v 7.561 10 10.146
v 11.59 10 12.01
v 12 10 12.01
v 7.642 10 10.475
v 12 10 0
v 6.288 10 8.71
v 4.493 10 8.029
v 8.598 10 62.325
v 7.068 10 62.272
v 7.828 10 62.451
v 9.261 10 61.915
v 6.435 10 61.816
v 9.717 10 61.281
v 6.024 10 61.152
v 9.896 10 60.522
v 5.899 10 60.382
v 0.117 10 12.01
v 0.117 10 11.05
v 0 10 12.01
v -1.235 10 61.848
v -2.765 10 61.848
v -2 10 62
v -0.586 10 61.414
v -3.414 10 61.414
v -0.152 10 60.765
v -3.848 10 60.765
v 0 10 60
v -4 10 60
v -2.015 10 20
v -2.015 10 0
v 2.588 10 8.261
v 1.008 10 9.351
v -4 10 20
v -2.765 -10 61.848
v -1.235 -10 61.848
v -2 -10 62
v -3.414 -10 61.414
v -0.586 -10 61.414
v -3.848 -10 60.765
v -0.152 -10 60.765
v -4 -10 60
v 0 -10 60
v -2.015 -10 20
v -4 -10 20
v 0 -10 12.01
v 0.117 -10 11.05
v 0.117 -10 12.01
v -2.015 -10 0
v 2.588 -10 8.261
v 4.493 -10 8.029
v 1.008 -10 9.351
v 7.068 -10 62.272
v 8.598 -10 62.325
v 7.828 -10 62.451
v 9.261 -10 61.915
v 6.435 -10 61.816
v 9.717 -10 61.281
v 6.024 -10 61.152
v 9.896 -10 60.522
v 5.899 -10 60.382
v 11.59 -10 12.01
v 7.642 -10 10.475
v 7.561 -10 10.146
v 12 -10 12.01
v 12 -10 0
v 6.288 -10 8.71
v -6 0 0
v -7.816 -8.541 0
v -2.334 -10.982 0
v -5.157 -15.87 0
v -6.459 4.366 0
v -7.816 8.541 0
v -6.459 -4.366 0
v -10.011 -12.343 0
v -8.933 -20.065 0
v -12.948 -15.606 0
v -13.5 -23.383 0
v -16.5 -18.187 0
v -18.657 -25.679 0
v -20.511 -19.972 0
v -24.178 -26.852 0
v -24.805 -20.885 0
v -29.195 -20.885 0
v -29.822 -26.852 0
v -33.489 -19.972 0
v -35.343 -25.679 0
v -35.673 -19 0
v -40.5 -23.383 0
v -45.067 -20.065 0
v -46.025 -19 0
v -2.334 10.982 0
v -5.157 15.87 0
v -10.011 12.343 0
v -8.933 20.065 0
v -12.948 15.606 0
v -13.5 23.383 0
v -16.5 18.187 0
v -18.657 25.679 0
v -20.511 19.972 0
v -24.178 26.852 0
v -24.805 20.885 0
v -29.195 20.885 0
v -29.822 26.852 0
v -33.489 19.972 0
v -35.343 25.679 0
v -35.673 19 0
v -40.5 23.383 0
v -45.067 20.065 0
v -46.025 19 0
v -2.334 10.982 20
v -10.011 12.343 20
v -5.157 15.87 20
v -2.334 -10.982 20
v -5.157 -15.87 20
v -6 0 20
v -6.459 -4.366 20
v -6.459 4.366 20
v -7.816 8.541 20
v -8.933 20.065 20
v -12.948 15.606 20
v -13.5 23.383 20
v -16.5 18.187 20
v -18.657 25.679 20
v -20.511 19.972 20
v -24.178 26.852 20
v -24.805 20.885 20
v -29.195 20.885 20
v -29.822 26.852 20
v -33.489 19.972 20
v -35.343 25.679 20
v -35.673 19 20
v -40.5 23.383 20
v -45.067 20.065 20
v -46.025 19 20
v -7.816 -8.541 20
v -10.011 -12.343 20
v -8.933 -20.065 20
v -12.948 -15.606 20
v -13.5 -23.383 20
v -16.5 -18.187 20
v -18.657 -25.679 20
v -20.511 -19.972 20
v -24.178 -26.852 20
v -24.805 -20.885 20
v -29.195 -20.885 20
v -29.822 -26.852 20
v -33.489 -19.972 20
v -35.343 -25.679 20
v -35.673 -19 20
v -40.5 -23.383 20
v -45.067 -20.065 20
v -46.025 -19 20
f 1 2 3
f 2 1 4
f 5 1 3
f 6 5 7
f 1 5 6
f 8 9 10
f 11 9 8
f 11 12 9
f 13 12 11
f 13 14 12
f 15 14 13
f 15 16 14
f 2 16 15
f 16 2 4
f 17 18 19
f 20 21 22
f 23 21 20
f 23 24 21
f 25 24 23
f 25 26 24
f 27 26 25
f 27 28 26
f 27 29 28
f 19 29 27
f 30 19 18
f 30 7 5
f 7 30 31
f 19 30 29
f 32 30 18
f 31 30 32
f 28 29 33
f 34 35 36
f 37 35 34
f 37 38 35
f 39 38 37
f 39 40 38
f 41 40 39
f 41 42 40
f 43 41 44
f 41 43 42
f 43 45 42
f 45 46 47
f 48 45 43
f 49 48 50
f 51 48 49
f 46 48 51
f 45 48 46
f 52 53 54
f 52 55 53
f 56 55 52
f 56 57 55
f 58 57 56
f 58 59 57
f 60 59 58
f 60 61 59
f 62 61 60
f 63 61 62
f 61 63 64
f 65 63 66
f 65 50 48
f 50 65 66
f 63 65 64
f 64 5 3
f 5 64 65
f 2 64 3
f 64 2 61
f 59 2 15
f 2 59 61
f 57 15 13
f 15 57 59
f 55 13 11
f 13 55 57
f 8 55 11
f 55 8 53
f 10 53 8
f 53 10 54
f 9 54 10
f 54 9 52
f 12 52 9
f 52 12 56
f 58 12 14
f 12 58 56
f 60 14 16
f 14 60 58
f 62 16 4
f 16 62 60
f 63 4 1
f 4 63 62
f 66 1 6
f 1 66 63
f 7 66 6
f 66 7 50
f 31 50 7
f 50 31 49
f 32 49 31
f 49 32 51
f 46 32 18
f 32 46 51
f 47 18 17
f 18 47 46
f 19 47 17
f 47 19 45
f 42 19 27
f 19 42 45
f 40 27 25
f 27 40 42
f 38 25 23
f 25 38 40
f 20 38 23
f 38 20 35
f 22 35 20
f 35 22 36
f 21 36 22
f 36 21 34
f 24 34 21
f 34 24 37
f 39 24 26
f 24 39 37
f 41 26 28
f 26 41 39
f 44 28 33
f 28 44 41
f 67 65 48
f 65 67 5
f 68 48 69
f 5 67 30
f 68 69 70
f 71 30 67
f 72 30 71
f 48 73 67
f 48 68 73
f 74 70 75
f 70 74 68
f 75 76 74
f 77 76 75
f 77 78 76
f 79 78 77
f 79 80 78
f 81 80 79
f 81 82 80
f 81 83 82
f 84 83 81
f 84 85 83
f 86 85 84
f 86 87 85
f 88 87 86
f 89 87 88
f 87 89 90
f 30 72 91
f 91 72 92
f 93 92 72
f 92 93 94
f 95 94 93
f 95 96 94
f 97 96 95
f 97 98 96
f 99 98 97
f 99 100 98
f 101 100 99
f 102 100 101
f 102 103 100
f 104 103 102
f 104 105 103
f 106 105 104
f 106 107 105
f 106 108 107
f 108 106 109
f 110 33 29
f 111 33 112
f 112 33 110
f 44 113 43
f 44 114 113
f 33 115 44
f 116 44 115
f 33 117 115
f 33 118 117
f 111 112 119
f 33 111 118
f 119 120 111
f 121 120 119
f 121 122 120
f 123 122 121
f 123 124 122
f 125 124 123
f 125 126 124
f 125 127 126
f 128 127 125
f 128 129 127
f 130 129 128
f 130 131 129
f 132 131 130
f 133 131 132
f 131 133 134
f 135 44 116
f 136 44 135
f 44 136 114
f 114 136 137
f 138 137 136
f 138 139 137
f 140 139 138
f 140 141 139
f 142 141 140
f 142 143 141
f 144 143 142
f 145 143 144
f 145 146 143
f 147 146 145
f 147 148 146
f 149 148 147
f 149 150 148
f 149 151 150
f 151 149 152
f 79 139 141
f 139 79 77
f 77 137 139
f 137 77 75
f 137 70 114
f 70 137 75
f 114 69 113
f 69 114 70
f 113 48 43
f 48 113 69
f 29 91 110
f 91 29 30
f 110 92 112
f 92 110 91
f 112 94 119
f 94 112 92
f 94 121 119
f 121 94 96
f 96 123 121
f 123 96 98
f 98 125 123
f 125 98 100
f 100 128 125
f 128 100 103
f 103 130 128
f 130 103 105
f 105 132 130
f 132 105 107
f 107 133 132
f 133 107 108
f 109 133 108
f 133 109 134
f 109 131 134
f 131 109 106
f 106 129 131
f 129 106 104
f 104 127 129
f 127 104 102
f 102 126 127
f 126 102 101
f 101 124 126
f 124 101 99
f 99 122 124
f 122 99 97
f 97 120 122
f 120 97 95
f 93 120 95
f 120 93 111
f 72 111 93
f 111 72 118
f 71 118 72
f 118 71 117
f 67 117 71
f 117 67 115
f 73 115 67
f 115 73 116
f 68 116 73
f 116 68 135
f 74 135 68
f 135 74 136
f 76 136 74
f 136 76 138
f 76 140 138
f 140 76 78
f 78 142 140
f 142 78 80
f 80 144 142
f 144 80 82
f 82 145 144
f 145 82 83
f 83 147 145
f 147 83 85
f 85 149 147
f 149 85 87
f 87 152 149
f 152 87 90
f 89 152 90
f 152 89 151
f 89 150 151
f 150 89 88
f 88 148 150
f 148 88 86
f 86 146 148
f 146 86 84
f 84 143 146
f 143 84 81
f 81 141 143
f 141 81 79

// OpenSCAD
/* [Global] */
item_diameter=42;

/* [Grip] */
grip_thickness = 6;
grip_height=20;
grip_gap=38;

/* [Clip] */
clip_height=60;
clip_gap=8;
clip_thickness=4;


/* [Hidden] */
fudge = 0.01;

color([1,0,0]) clip();
color([0,1,0]) grip();

module clip(){
  // Cmd-8 for side-view
  width=20;
  top_thickness = clip_thickness + 4;

  translate([-clip_thickness, width/2, 0])
    rotate(a=90, v=[1, 0, 0])
    linear_extrude(height=width){
      // joint side
      square([clip_thickness, clip_height]);

      // joint side bottom nub
      translate([clip_thickness/2, clip_height])
        circle(r=clip_thickness/2, $fn=16);

      // body side
      body_side_height = clip_height - top_thickness;
      rotate(2)
        translate([clip_thickness + clip_gap, 0]){
          translate([0, top_thickness])
            #square([clip_thickness, body_side_height]);

            //body side bottom nub
            translate([clip_thickness/2, clip_height])
            circle(r=clip_thickness/2, $fn=16);
        }


      top_curve_r = clip_gap / 2 + fudge;
      // "top" bridge
      difference(){
        color([0,1,0])
          square([clip_thickness + clip_gap + clip_thickness, top_thickness + top_curve_r]);

        color([1,0,0])
          translate([clip_thickness + top_curve_r, top_thickness + top_curve_r])
          circle(r=top_curve_r);
      }

    }
}

module grip(){
// Cmd-4 for top-view
item_r = item_diameter / 2;
outer_r = item_r + grip_thickness;
    


translate([-outer_r,0])
linear_extrude(height=grip_height){
    
    difference(){
        //outer
        circle(r=outer_r);
        //inner (hole)
        circle(r=item_r);

        //grip_gap
        translate([-item_r,0])
        #square([item_diameter, grip_gap], center=true);

    }
}

}
